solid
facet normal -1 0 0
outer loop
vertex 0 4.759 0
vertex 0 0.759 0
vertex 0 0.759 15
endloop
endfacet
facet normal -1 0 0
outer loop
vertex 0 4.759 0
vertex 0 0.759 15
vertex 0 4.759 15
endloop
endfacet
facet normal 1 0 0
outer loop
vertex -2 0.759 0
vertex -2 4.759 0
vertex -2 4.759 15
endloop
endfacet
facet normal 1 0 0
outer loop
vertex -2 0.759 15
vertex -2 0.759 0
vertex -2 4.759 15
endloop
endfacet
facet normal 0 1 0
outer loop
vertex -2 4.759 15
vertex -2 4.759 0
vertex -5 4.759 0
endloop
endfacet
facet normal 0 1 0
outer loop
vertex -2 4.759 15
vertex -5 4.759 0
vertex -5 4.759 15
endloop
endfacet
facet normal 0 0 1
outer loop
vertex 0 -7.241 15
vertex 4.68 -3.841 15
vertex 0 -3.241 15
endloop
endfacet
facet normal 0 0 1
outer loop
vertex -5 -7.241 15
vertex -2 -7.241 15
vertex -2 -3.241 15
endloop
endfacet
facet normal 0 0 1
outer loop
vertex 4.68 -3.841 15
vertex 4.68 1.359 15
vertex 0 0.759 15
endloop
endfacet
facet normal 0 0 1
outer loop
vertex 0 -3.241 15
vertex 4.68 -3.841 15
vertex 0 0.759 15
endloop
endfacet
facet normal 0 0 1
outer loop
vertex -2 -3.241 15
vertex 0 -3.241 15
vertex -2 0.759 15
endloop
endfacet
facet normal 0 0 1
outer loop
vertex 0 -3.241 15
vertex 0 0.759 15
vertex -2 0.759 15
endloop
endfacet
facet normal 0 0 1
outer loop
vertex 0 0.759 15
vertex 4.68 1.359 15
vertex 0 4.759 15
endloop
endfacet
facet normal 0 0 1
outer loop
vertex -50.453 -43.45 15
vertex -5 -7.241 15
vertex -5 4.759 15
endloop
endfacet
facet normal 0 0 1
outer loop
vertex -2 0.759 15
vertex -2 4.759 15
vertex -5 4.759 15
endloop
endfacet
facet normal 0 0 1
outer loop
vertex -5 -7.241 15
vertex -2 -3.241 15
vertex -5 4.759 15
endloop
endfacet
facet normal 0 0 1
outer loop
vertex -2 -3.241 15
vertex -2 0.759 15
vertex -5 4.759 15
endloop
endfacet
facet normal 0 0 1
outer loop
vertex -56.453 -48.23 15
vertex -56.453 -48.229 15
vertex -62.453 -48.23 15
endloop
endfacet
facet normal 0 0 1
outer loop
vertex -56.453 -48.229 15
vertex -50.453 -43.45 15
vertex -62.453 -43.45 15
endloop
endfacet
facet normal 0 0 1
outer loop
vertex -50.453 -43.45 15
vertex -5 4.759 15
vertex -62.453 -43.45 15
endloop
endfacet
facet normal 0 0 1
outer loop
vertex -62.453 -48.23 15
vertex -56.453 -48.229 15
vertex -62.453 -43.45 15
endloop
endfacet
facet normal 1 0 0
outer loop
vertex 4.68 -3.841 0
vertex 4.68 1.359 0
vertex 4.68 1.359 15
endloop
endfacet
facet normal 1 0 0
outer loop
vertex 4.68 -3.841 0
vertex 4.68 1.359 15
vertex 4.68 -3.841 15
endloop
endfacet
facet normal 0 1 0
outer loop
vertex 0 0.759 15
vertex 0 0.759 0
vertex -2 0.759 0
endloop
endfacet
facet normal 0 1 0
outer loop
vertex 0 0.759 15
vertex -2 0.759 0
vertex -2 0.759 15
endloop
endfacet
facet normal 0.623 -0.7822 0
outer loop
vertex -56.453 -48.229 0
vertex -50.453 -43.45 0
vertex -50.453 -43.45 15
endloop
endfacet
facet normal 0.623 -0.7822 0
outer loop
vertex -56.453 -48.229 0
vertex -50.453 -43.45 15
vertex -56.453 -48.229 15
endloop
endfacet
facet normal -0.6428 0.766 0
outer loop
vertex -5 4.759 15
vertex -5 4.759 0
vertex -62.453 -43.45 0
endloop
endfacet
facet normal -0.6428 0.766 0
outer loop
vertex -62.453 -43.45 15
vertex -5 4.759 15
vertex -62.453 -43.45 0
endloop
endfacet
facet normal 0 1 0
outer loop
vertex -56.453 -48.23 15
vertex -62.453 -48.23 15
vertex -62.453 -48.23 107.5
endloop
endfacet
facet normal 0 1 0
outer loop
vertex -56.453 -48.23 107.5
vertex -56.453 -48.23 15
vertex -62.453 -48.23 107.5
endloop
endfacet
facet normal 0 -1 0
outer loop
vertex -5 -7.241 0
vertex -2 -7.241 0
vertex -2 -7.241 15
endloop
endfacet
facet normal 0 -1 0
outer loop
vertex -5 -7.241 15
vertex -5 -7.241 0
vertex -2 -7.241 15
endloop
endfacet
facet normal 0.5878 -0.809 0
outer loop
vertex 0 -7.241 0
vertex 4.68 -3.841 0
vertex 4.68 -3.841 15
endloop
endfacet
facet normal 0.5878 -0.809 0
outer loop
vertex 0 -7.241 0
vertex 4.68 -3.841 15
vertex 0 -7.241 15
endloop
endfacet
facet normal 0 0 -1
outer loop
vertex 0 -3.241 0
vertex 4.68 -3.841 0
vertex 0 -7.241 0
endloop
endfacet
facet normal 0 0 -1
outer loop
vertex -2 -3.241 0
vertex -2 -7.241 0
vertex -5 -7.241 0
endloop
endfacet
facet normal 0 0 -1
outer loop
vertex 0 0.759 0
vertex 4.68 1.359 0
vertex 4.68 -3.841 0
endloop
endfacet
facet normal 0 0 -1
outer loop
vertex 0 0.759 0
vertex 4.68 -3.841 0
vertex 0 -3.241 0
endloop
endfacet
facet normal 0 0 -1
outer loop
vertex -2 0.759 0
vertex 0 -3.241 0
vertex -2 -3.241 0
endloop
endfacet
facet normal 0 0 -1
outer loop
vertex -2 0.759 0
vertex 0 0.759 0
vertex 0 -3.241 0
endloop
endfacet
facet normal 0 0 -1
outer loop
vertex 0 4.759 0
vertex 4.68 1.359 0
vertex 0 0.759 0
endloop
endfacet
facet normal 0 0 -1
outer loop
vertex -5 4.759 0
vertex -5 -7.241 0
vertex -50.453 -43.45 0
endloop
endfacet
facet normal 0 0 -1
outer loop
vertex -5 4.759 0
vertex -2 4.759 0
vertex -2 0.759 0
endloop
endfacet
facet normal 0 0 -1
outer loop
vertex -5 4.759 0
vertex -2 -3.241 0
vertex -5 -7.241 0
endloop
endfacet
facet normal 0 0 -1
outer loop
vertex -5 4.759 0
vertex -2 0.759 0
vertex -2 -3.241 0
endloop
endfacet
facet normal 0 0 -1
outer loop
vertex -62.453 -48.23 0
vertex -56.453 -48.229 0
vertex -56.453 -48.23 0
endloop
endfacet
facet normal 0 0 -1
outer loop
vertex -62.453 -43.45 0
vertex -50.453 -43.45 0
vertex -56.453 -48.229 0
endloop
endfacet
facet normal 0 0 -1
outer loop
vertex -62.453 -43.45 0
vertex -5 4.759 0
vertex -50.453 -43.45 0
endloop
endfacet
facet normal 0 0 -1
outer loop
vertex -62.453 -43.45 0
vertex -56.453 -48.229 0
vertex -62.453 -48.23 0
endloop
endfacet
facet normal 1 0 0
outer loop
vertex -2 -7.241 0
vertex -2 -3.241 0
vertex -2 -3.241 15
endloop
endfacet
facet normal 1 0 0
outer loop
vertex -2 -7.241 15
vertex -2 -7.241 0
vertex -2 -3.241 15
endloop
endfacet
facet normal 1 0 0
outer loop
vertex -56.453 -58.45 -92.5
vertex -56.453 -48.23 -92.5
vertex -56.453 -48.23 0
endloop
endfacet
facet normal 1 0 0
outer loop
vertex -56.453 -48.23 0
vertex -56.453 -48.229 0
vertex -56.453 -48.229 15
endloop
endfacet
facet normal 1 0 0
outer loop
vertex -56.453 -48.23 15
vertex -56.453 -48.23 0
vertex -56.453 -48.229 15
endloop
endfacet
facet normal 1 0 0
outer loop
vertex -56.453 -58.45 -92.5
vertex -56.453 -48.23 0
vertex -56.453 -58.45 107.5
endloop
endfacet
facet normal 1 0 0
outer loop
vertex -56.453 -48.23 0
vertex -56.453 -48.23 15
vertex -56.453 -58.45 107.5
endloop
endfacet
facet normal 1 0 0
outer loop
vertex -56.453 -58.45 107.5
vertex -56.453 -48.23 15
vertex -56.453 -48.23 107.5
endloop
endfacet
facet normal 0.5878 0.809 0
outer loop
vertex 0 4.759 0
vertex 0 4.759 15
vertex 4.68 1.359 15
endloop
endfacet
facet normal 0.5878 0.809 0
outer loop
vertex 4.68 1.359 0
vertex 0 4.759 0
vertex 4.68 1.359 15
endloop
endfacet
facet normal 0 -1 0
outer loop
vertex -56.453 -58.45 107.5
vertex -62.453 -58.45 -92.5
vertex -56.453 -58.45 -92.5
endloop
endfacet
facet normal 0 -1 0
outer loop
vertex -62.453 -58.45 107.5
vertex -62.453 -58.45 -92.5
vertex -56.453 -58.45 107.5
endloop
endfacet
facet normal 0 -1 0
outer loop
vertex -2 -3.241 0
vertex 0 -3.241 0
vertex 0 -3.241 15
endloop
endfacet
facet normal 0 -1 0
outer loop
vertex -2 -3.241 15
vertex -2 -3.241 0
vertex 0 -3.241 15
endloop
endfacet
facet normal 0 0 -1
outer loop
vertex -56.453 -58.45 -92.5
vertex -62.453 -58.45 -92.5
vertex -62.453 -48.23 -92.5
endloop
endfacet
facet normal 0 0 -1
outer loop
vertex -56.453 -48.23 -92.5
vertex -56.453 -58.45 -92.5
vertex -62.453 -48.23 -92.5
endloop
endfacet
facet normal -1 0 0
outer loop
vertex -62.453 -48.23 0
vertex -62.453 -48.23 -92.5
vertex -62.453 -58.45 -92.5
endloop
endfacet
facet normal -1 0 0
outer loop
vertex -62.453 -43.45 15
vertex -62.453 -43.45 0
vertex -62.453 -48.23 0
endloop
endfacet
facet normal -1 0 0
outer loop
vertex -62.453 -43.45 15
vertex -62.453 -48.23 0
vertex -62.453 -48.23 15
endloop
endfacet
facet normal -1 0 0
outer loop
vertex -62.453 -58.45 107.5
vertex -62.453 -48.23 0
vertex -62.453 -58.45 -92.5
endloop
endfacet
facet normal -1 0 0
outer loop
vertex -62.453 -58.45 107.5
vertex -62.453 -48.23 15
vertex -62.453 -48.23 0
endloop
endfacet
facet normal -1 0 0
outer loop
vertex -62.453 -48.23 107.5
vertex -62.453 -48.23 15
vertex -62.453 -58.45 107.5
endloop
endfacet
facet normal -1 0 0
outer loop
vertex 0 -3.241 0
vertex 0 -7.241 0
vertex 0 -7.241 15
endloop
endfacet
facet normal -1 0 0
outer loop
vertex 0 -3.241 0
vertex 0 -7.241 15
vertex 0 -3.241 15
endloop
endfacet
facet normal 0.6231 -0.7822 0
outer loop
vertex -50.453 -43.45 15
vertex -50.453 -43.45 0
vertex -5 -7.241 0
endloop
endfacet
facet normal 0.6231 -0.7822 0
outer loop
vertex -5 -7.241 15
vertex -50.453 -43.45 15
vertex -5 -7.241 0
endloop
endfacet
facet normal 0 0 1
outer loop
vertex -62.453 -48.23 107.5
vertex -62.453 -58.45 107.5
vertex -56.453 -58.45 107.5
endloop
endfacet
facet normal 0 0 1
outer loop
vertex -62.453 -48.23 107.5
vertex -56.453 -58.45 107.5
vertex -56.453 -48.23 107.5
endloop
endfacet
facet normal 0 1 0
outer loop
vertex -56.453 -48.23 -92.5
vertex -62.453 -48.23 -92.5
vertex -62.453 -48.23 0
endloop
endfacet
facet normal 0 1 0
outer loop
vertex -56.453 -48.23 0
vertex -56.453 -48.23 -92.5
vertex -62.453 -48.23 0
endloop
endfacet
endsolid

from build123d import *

# Parameters (mm, degrees)
BOSS_EXTRU_1_DEPTH = 15
ESQUISSE3_W        = 15
ESQUISSE3_H        = 4
BOSS_EXTRU_2_DEPTH = 2
ESQUISSE4_W        = 15
ESQUISSE4_H        = 12
BOSS_EXTRU_3_DEPTH = 3
BOSS_EXTRU_4_DEPTH = 15
ESQUISSE6_W        = 6
ESQUISSE6_H        = 15
BOSS_EXTRU_5_DEPTH = 15
BOSS_EXTRU_6_DEPTH = 15
ESQUISSE8_W        = 200
ESQUISSE8_H        = 10.22
BOSS_EXTRU_7_DEPTH = 6


with BuildPart() as part:
    # Esquisse1 → Boss.-Extru.1 (new body)
    with BuildSketch(Plane.XY):
        Polygon((0, 4.759390863), (4.68, 1.359390863), (4.68, -3.840609137), (0, -7.240609137), align=None)
    extrude(amount=BOSS_EXTRU_1_DEPTH)

    # Esquisse3 → Boss.-Extru.2 (add)
    with BuildSketch(Plane.ZY):
        with Locations((7.5, -1.240609137)):
            Rectangle(ESQUISSE3_W, ESQUISSE3_H)
    extrude(amount=BOSS_EXTRU_2_DEPTH)

    # Esquisse4 → Boss.-Extru.3 (add)
    with BuildSketch(Plane.ZY.offset(2)):
        with Locations((7.5, -1.240609137)):
            Rectangle(ESQUISSE4_W, ESQUISSE4_H)
    extrude(amount=BOSS_EXTRU_3_DEPTH)

    # Esquisse5 → Boss.-Extru.4 (add)
    with BuildSketch(Plane(origin=(0, 0, 0), x_dir=(-1, 0, 0), z_dir=(0, 0, -1))):
        Polygon((5, 4.759390863), (62.453333234, -43.449679864), (50.453333234, -43.449679864), (5, -7.240609137), align=None)
    extrude(amount=-BOSS_EXTRU_4_DEPTH)

    # Esquisse6 → Boss.-Extru.5 (add)
    with BuildSketch(Plane(origin=(0, -43.449679864, 0), x_dir=(-1, 0, 0), z_dir=(0, -1, 0))):
        with Locations((59.453333234, -7.5)):
            Rectangle(ESQUISSE6_W, ESQUISSE6_H)
    extrude(amount=BOSS_EXTRU_5_DEPTH)

    # Esquisse7 → Boss.-Extru.6 (add)
    with BuildSketch(Plane(origin=(0, 0, 0), x_dir=(-1, 0, 0), z_dir=(0, 0, -1))):
        Polygon((50.453333234, -43.449679864), (56.453333234, -48.229404669), (56.453333234, -43.449679864), align=None)
    extrude(amount=-BOSS_EXTRU_6_DEPTH)

    # Esquisse8 → Boss.-Extru.7 (add)
    with BuildSketch(Plane.ZY.offset(62.453333234)):
        with Locations((7.5, -53.339679864)):
            Rectangle(ESQUISSE8_W, ESQUISSE8_H)
    extrude(amount=-BOSS_EXTRU_7_DEPTH)


solid = part.part
